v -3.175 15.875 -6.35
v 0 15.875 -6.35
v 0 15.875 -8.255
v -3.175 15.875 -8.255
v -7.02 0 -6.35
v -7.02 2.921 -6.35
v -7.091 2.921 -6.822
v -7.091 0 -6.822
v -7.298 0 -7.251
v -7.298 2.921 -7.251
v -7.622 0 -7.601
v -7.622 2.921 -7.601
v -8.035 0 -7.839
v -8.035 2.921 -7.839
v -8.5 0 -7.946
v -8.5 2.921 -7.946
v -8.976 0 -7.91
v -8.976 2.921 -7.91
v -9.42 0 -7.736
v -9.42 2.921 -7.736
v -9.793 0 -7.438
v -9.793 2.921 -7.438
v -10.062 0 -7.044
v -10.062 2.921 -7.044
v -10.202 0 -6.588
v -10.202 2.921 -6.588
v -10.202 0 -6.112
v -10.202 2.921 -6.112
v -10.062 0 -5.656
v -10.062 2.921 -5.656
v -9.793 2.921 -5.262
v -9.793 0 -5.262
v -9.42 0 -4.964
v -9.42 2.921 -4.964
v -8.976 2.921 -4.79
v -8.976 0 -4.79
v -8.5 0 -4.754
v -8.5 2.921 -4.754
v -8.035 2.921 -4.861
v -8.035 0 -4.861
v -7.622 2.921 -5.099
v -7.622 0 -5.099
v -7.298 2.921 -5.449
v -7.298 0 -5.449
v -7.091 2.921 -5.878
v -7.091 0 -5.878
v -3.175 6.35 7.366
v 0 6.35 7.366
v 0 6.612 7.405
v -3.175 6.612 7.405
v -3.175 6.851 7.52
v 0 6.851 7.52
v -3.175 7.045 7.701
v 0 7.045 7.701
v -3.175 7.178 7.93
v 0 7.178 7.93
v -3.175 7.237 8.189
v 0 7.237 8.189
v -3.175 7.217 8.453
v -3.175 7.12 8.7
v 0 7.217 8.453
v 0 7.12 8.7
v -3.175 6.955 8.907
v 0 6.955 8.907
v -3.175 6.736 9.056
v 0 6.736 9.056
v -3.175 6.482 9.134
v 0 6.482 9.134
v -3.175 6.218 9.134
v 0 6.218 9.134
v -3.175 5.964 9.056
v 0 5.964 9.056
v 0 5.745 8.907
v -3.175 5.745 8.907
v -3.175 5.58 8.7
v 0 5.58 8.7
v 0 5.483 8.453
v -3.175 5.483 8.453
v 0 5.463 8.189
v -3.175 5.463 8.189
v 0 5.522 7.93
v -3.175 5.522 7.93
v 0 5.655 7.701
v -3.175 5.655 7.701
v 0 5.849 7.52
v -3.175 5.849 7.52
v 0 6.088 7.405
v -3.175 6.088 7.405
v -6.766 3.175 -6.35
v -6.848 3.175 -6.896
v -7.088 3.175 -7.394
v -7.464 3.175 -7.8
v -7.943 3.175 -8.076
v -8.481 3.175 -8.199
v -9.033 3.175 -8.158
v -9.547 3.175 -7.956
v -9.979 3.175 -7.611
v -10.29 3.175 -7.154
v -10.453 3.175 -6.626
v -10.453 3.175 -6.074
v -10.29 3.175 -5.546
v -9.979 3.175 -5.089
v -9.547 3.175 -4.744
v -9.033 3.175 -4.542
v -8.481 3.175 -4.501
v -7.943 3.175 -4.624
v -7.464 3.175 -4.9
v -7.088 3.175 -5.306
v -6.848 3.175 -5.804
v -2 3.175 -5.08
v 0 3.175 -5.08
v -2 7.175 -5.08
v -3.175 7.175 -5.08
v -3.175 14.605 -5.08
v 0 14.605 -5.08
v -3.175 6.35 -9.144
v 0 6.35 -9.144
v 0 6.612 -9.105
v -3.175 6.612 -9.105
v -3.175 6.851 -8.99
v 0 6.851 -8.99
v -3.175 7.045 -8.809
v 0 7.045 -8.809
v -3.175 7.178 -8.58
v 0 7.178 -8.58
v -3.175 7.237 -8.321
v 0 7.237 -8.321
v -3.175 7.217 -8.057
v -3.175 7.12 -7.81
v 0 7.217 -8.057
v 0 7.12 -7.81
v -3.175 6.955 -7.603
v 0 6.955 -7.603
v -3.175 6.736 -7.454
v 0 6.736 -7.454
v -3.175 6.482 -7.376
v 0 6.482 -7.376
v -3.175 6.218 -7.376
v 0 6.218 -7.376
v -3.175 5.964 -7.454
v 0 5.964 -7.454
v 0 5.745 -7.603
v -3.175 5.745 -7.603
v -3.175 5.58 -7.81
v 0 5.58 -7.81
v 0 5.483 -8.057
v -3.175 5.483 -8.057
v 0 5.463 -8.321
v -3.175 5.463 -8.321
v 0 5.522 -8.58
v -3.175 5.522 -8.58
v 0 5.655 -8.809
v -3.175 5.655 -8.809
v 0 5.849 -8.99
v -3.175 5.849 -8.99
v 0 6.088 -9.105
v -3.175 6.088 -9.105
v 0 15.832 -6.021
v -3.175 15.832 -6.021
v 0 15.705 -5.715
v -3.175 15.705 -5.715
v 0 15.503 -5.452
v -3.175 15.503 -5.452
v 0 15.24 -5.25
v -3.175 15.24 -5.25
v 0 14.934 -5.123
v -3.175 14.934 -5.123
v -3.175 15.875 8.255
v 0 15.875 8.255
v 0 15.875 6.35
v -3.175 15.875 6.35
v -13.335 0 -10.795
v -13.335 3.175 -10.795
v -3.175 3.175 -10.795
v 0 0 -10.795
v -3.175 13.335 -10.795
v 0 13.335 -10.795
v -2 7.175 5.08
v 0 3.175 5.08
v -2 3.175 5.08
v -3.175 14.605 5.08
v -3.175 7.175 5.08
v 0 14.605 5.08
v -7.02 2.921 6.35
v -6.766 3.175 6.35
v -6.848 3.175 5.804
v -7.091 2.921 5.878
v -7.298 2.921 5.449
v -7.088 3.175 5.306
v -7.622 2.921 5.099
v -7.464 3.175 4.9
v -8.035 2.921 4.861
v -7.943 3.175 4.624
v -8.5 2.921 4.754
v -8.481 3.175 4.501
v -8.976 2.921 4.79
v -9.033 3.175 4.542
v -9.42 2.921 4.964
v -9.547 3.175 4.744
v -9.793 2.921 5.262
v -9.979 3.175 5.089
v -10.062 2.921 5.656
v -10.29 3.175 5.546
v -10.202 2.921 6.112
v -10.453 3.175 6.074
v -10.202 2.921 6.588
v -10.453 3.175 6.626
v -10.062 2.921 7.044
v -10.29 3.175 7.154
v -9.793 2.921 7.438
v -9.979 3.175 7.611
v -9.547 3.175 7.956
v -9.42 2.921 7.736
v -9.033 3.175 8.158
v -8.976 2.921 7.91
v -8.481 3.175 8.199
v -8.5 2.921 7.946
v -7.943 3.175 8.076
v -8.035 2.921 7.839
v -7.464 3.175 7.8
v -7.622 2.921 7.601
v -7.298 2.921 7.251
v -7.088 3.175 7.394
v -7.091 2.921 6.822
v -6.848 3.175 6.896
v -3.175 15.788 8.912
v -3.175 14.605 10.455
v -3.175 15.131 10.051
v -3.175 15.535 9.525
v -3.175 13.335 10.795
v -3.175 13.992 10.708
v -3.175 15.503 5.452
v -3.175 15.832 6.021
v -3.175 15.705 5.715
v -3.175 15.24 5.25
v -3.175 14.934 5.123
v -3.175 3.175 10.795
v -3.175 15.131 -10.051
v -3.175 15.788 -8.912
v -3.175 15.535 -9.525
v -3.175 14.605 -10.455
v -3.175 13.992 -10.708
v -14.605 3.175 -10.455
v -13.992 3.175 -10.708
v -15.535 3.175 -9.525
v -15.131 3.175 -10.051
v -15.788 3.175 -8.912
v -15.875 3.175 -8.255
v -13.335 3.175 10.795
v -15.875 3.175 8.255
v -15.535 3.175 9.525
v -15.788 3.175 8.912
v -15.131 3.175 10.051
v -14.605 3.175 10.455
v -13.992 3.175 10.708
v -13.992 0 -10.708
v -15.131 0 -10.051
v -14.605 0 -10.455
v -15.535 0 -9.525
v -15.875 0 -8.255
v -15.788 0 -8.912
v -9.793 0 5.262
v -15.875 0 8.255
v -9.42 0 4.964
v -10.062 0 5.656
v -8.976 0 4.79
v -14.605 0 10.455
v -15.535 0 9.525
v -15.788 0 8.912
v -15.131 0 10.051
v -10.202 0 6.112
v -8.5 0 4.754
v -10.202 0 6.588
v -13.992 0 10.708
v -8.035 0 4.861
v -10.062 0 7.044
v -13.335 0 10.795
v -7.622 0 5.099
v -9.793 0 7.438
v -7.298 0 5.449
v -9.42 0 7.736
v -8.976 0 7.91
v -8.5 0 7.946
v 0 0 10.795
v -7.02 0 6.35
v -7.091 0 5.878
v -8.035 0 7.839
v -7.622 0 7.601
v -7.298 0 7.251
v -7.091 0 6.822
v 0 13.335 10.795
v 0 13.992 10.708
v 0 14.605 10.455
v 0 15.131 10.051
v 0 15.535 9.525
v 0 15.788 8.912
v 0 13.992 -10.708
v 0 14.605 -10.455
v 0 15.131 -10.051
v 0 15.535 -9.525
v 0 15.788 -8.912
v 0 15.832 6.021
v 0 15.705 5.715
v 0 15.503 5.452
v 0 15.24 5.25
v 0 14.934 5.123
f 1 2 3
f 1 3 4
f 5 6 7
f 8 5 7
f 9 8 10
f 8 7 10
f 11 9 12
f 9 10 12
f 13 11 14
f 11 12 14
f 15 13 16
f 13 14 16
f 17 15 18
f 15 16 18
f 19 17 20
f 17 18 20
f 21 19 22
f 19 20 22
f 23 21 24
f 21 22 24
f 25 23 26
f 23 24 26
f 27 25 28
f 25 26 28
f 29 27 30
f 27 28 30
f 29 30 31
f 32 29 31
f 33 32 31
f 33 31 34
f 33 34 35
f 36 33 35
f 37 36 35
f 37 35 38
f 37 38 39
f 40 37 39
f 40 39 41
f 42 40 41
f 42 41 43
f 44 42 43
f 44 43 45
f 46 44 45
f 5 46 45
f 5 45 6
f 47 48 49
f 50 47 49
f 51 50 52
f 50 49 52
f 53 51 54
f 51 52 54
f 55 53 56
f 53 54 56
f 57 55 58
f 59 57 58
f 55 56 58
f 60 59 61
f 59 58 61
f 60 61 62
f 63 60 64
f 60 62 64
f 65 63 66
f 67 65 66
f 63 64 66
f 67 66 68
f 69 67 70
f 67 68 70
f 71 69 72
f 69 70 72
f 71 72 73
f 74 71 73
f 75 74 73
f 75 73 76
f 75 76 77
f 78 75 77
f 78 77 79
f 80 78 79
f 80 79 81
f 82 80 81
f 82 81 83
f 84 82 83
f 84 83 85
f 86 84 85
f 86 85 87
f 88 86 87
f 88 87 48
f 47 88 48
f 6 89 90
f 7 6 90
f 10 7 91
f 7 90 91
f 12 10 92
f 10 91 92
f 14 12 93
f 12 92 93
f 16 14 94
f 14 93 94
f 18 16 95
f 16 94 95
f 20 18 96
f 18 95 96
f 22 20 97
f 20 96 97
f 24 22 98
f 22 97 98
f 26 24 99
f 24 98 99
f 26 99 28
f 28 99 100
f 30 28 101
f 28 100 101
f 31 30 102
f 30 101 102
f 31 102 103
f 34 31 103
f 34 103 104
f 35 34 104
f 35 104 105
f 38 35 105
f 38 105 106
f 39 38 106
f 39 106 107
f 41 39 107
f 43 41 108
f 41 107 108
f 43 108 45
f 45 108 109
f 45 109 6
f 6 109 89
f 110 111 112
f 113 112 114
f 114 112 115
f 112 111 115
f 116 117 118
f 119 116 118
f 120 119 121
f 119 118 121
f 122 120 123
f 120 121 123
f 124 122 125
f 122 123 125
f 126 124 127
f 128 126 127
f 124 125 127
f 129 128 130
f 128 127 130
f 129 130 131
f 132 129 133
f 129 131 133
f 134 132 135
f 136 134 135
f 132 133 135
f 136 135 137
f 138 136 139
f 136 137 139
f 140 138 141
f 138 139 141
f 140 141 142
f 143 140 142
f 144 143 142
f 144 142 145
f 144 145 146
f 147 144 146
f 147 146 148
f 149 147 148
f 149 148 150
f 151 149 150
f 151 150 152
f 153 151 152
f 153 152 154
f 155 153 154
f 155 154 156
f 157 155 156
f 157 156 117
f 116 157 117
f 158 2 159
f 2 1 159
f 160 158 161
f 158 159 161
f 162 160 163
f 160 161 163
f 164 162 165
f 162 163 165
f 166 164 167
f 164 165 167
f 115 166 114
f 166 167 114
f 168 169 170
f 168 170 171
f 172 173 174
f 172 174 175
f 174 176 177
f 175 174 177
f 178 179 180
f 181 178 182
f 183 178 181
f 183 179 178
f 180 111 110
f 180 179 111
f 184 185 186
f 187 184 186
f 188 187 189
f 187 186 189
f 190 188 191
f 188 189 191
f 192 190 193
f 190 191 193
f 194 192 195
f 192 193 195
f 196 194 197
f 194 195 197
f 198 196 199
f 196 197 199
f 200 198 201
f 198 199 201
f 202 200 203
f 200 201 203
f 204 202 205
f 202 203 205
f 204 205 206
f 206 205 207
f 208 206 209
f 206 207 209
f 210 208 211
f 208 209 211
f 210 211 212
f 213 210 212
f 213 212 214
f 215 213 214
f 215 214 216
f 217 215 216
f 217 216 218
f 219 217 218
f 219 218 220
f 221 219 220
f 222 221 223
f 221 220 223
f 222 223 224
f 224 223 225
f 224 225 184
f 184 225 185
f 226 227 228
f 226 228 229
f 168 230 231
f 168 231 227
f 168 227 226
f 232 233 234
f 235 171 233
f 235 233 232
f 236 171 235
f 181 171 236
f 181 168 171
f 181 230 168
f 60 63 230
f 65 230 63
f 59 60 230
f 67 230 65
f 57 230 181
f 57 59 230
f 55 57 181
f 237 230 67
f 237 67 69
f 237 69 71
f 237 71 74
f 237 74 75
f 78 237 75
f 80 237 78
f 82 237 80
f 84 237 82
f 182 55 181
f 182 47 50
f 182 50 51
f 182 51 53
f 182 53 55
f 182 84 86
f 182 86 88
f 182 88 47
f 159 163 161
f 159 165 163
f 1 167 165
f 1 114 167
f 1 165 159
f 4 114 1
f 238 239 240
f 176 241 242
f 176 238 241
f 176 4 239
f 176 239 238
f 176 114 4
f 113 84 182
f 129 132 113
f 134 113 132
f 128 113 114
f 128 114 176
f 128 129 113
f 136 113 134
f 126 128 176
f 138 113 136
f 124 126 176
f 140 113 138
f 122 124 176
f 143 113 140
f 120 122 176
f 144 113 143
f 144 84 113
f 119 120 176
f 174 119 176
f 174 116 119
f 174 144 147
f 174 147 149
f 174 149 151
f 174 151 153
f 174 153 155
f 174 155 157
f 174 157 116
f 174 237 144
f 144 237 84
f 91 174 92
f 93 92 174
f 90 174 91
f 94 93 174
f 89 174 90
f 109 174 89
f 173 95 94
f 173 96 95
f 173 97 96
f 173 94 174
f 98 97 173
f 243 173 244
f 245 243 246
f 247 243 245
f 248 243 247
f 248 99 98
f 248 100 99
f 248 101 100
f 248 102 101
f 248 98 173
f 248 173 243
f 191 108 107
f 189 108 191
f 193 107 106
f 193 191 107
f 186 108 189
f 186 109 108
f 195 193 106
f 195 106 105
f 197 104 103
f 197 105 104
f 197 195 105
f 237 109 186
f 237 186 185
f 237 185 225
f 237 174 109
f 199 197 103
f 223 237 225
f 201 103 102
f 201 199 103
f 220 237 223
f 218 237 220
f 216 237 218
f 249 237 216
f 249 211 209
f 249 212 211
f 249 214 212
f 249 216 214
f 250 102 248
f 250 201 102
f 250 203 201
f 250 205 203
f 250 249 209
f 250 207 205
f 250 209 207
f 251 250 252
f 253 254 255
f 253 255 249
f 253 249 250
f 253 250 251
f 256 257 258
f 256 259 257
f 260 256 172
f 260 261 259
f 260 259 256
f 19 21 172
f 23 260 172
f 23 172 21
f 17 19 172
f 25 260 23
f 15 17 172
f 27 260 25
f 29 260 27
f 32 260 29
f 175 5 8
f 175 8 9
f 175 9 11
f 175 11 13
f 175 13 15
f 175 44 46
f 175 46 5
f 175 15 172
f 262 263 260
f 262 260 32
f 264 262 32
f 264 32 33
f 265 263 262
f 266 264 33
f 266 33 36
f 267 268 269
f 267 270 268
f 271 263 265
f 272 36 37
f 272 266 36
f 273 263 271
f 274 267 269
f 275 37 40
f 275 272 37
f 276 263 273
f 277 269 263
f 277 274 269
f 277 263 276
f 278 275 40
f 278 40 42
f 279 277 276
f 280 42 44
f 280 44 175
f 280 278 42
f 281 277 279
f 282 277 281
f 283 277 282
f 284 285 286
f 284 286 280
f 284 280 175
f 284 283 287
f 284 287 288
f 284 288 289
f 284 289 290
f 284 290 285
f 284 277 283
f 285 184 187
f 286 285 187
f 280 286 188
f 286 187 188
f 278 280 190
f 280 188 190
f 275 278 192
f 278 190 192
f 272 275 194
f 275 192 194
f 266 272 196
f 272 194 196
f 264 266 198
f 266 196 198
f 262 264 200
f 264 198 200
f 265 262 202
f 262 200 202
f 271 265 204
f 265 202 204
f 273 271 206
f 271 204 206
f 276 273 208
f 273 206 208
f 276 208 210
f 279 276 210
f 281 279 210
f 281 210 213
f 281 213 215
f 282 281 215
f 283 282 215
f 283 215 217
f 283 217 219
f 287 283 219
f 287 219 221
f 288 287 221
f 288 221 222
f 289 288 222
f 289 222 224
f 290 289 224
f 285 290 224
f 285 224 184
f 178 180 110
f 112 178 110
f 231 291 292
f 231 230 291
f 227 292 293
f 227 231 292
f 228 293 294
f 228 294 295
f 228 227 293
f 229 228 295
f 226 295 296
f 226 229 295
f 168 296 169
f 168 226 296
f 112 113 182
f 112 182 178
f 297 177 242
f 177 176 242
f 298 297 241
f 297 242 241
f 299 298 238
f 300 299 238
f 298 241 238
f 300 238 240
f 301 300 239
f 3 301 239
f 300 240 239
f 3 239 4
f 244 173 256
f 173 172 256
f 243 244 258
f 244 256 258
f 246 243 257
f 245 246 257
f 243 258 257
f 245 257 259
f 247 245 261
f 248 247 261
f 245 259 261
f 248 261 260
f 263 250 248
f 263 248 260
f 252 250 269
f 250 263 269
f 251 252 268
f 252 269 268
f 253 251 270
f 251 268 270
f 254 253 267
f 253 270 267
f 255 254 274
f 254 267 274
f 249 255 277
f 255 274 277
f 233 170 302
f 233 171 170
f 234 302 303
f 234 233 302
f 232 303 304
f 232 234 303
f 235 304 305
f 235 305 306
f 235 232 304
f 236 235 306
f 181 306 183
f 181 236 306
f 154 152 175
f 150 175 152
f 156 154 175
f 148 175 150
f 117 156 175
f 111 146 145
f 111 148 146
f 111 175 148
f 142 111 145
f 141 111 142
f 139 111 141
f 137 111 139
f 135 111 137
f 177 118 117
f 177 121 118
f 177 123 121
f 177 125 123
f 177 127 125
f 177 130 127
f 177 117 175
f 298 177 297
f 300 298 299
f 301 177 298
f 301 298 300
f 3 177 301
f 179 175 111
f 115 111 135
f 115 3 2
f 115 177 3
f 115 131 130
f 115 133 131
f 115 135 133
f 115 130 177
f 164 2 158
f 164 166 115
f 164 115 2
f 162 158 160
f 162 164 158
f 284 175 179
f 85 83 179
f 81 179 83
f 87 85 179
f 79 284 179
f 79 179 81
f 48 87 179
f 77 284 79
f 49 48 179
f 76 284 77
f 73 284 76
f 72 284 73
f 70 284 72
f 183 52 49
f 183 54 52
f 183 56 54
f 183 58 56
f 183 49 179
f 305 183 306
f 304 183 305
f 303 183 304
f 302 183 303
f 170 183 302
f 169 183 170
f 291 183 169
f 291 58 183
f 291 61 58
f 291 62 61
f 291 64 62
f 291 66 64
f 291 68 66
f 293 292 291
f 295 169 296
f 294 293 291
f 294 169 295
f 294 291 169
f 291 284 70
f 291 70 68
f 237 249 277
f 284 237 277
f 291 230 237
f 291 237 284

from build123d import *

# Parameters (mm, degrees)
BOSS_EXTRUDE1_DEPTH = 10.795
SKETCH2_R           = 0.889
SKETCH2_W           = 10.16
SKETCH2_H           = 12.7
CUT_EXTRUDE1_DEPTH  = 16.875
SKETCH3_R           = 1.6
CUT_EXTRUDE2_DEPTH  = 4.175
SKETCH5_W           = 1.175
SKETCH5_H           = 10.16
BOSS_EXTRUDE2_DEPTH = 4
CHAMFER1_SIZE       = 0.254
FILLET1_R           = 2.54
FILLET2_R           = 1.27


with BuildPart() as part:
    # Sketch1 → Boss-Extrude1 (new body, symmetric)
    with BuildSketch(Plane.XY):
        Polygon((-15.875, 0), (0, 0), (0, 15.875), (-3.175, 15.875), (-3.175, 3.175), (-15.875, 3.175), align=None)
    extrude(amount=BOSS_EXTRUDE1_DEPTH, both=True)

    # Sketch2 → Cut-Extrude1 (cut, through all)
    with BuildSketch(Plane(origin=(0, 0, 0), x_dir=(0, 0, -1), z_dir=(1, 0, 0))):
        with Locations((-8.255, 6.35)):
            Circle(SKETCH2_R)
        with Locations((8.255, 6.35)):
            Circle(SKETCH2_R)
        with Locations((0, 9.525)):
            Rectangle(SKETCH2_W, SKETCH2_H)
    extrude(amount=-CUT_EXTRUDE1_DEPTH, mode=Mode.SUBTRACT)

    # Sketch3 → Cut-Extrude2 (cut, through all)
    with BuildSketch(Plane(origin=(0, 3.175, 0), x_dir=(1, 0, 0), z_dir=(0, 1, 0))):
        with Locations((-8.62, 6.35)):
            Circle(SKETCH3_R)
        with Locations((-8.62, -6.35)):
            Circle(SKETCH3_R)
    extrude(amount=-CUT_EXTRUDE2_DEPTH, mode=Mode.SUBTRACT)

    # Sketch5 → Boss-Extrude2 (add)
    with BuildSketch(Plane(origin=(0, 3.175, 0), x_dir=(1, 0, 0), z_dir=(0, 1, 0))):
        with Locations((-2.5875, 0)):
            Rectangle(SKETCH5_W, SKETCH5_H)
    extrude(amount=BOSS_EXTRUDE2_DEPTH)

    # Chamfer1
    chamfer1_edges = [part.edges().sort_by_distance(p)[0] for p in [
        (-10.22, 3.175, -6.35),
        (-10.22, 3.175, 6.35),
    ]]
    chamfer(chamfer1_edges, length=CHAMFER1_SIZE)

    # Fillet1
    fillet1_edges = [part.edges().sort_by_distance(p)[0] for p in [
        (-1.5875, 15.875, 10.795),
        (-15.875, 1.5875, 10.795),
        (-1.5875, 15.875, -10.795),
        (-15.875, 1.5875, -10.795),
    ]]
    fillet(fillet1_edges, radius=FILLET1_R)

    # Fillet2
    fillet2_edges = [part.edges().sort_by_distance(p)[0] for p in [
        (-1.5875, 15.875, 5.08),
        (-1.5875, 15.875, -5.08),
    ]]
    fillet(fillet2_edges, radius=FILLET2_R)


solid = part.part
